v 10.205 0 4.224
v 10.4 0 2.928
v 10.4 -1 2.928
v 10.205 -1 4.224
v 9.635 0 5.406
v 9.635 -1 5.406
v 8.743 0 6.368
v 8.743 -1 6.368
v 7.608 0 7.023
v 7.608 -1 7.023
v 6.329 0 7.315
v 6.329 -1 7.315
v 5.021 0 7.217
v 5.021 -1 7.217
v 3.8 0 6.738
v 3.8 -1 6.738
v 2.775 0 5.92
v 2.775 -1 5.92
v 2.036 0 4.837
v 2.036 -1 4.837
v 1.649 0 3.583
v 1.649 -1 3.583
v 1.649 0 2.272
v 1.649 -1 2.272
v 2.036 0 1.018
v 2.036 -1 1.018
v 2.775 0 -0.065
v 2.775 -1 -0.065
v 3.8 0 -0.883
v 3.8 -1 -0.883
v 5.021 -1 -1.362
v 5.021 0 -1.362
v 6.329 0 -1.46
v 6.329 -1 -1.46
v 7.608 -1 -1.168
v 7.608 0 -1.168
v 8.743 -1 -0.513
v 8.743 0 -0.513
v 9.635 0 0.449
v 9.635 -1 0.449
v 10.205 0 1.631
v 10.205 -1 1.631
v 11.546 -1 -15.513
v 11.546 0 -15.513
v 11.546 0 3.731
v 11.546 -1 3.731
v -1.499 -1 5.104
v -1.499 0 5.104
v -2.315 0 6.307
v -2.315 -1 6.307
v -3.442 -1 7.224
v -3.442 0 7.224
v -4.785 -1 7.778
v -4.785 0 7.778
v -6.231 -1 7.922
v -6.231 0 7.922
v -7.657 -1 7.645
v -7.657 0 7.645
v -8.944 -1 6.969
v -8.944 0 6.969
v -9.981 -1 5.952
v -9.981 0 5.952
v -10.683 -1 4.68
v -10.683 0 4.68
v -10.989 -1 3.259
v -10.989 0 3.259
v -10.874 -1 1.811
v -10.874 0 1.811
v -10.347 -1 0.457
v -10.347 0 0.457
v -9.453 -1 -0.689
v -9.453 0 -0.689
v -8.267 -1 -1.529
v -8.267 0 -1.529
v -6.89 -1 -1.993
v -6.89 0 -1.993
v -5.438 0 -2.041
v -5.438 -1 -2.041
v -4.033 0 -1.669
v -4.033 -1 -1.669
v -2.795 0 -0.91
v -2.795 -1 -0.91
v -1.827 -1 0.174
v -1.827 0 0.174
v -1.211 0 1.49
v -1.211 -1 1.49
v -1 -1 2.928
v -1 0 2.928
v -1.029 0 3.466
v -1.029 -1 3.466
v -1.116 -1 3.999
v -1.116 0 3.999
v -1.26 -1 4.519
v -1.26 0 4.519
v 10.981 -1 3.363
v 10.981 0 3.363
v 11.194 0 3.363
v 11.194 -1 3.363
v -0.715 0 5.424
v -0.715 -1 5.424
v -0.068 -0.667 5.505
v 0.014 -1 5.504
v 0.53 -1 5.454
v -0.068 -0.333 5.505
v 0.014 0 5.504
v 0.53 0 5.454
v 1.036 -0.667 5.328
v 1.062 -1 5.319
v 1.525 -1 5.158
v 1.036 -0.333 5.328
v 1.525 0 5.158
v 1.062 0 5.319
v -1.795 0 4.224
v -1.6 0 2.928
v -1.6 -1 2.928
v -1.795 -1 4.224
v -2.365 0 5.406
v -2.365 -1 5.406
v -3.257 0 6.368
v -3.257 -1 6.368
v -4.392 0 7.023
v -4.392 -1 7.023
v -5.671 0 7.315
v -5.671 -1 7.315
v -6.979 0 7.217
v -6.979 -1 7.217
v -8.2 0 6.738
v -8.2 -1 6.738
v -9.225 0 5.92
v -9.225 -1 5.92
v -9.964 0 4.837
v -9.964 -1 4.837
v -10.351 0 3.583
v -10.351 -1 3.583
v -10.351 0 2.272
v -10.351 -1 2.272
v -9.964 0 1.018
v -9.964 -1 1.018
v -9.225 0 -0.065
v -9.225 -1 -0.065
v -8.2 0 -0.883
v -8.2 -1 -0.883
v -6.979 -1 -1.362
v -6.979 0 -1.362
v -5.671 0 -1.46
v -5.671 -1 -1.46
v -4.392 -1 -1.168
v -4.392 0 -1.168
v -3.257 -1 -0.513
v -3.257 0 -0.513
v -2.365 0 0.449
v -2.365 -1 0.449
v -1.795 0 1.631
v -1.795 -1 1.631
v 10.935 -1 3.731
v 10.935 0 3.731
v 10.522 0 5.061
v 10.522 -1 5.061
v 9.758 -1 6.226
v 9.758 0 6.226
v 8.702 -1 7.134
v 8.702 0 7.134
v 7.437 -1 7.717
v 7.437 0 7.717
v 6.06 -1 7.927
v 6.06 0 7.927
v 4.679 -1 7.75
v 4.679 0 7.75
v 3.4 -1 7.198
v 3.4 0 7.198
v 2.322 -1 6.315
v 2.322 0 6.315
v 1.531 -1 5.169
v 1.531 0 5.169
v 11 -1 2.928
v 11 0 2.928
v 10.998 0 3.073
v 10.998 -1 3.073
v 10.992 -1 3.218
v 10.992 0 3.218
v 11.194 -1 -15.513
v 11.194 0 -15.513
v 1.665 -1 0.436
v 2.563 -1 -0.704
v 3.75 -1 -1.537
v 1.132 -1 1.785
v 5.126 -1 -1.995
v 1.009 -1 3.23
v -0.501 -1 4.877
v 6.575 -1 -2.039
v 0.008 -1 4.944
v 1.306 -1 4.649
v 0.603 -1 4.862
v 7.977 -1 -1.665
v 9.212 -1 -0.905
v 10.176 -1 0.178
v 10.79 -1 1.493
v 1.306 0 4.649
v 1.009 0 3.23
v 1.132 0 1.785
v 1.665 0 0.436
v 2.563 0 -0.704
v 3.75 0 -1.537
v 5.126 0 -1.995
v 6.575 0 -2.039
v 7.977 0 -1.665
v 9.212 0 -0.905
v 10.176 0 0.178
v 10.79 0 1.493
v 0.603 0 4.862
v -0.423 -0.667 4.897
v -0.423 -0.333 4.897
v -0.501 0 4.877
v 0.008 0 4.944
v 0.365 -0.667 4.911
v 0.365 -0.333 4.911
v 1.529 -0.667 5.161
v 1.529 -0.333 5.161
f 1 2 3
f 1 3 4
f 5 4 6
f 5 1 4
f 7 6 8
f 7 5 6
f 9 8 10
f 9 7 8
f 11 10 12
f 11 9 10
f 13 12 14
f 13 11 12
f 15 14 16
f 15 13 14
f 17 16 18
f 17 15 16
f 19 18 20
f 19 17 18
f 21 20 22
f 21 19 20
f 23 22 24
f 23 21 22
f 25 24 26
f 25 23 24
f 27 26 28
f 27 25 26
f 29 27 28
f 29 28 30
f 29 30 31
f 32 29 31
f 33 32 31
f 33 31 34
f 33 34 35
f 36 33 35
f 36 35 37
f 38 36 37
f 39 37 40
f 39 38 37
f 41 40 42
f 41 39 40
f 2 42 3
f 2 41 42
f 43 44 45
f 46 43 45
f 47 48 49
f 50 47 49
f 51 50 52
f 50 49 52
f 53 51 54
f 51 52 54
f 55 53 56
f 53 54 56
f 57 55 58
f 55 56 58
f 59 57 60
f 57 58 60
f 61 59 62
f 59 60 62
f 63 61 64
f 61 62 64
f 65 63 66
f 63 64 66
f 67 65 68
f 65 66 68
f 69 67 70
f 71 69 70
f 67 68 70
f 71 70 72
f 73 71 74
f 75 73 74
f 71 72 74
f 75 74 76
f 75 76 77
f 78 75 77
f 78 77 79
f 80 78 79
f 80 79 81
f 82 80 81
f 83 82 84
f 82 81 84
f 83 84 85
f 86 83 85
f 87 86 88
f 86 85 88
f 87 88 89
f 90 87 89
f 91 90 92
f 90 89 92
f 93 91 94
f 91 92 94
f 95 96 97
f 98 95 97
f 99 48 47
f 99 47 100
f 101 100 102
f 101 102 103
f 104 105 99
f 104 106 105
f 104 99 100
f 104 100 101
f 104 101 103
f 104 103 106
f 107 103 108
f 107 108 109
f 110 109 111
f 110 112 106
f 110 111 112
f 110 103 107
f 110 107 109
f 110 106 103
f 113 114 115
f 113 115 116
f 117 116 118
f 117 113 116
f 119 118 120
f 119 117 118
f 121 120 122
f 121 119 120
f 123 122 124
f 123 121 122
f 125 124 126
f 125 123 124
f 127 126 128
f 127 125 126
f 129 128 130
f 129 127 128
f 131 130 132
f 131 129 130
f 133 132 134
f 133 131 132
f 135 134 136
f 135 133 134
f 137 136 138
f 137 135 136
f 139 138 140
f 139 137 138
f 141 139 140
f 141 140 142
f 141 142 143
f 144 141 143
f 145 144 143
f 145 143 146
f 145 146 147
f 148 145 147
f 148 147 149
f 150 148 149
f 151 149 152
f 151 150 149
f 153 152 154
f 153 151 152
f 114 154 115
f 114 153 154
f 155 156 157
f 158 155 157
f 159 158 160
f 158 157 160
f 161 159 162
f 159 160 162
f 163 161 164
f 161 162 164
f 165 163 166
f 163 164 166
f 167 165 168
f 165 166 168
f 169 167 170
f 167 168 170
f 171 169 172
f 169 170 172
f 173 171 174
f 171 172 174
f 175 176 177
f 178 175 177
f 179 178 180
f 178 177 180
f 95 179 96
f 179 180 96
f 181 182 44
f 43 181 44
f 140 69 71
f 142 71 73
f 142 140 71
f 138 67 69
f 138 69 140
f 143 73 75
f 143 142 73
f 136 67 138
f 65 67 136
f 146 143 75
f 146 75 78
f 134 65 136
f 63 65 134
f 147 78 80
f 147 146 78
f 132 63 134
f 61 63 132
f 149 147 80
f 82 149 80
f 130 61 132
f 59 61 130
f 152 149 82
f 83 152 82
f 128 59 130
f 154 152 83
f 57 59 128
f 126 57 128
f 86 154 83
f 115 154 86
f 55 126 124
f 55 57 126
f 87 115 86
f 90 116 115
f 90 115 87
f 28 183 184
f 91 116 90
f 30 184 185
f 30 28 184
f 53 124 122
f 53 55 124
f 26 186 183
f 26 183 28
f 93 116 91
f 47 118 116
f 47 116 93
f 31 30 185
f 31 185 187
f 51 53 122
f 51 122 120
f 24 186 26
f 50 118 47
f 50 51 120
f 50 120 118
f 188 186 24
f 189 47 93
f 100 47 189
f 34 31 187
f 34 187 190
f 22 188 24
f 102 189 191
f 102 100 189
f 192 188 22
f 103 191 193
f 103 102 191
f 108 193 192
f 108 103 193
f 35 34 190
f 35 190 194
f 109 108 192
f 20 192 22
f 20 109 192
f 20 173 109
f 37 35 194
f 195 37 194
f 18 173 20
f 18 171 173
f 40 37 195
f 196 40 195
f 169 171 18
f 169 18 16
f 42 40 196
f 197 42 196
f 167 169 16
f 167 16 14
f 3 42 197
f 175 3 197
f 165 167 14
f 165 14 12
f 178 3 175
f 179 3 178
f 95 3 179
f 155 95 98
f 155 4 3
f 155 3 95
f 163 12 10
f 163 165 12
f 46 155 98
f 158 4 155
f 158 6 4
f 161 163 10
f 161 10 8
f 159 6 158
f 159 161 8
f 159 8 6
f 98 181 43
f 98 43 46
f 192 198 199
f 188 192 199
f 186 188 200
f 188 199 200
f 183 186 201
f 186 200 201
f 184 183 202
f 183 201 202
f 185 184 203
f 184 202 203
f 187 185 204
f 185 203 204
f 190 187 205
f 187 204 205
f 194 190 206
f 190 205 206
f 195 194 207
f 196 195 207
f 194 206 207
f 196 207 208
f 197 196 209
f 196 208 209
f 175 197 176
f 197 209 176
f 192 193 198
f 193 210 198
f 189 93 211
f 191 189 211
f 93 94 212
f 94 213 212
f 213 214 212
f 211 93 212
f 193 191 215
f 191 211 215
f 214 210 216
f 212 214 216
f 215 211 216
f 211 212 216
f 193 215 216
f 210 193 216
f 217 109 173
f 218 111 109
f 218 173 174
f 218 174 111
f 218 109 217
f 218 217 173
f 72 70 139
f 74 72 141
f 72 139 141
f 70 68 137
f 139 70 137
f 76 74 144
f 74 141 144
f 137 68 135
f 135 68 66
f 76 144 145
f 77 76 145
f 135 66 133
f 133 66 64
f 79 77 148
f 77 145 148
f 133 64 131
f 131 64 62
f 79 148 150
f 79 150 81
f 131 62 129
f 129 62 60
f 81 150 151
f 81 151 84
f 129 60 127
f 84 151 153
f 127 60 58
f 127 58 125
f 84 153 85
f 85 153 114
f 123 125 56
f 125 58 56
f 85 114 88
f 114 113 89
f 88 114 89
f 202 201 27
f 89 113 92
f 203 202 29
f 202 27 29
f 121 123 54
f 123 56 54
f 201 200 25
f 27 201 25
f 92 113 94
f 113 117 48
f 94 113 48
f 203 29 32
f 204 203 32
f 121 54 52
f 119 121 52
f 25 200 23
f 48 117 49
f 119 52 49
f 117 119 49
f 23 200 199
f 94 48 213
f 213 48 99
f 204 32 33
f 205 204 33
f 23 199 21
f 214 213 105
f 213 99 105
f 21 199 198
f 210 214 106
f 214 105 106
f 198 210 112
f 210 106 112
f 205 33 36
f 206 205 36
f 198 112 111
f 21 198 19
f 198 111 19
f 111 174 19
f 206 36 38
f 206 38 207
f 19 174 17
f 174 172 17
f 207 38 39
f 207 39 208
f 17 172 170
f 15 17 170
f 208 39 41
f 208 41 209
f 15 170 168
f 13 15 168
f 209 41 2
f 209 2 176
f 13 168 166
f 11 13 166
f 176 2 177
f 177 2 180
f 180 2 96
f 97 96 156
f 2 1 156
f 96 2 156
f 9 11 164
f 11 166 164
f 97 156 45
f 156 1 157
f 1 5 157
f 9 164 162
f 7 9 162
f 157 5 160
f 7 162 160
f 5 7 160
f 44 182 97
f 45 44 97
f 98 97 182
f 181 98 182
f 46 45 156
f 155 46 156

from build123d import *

# Parameters (mm, degrees)
F0_R     = 4.4
F1_DEPTH = 1


with BuildPart() as f1:
    # F0 (on Front) → F1 (new body)
    with BuildSketch(Plane.XZ):
        with BuildLine():
            ThreePointArc((-1.4986815922, 5.1042757445), (-10.8737353251, 1.8109915545), (-1, 2.9275505456))
            ThreePointArc((-1, 2.9275505456), (-1.0654410934, 3.733855945), (-1.2600513589, 4.5190551417))
            ThreePointArc((-1.2600513589, 4.5190551417), (-1.3701106972, 4.81543959), (-1.4986815922, 5.1042757445))
        make_face()
        with Locations((-6, 2.9275505456)):
            Circle(F0_R, mode=Mode.SUBTRACT)
        with BuildLine():
            ThreePointArc((-1.4986815922, 5.1042757445), (-1.3701106972, 4.81543959), (-1.2600513589, 4.5190551417))
            add(Edge.make_bspline(
                [(-1.2600513589, 4.5190551417), (-0.3321453987, 5.1084347069), (0.2222434123, 5.0197322853), (1.305815297, 4.6493606322)],
                knots=[0, 0, 0, 0, 2.5691732555, 2.5691732555, 2.5691732555, 2.5691732555], degree=3))
            ThreePointArc((1.305815297, 4.6493606322), (1.408443121, 4.9068447194), (1.525181814, 5.1582459982))
            add(Edge.make_bspline(
                [(-1.4986815922, 5.1042757445), (0, 5.9878164902), (1.4394625627, 5.1295237069), (1.525181814, 5.1582459982)],
                knots=[0, 0, 0, 0, 0.9403135209, 0.9403135209, 0.9403135209, 0.9403135209], degree=3))
        make_face()
        with BuildLine():
            ThreePointArc((1.525181814, 5.1582459982), (1.408443121, 4.9068447194), (1.305815297, 4.6493606322))
            ThreePointArc((1.305815297, 4.6493606322), (5.1256212248, -1.9954019991), (11, 2.9275505456))
            ThreePointArc((11, 2.9275505456), (10.9952473554, 3.1455043436), (10.9809984568, 3.3630437989))
            ThreePointArc((10.9809984568, 3.3630437989), (10.9614239437, 3.5474476752), (10.9350249024, 3.7309988718))
            ThreePointArc((10.9350249024, 3.7309988718), (6.7558272917, 7.8700929182), (1.5306314581, 5.1691448079))
            add(Edge.make_bspline(
                [(1.525181814, 5.1582459982), (1.5306228506, 5.160069148), (1.5306095387, 5.165466158), (1.5306314581, 5.1691448079)],
                knots=[0.9403135209, 0.9403135209, 0.9403135209, 0.9403135209, 1, 1, 1, 1], degree=3))
        make_face()
        with Locations((6, 2.9275505456)):
            Circle(F0_R, mode=Mode.SUBTRACT)
        with BuildLine():
            ThreePointArc((10.9350249024, 3.7309988718), (10.9614239437, 3.5474476752), (10.9809984568, 3.3630437989))
            Line((10.9809984568, 3.3630437989), (11.1943203956, 3.3630437989))
            Line((11.1943203956, 3.3630437989), (11.1943203956, -15.5131826177))
            Line((11.1943203956, -15.5131826177), (11.5463633525, -15.5131826177))
            Line((11.5463633525, -15.5131826177), (11.5463633525, 3.7309988718))
            Line((11.5463633525, 3.7309988718), (10.9350249024, 3.7309988718))
        make_face()
    extrude(amount=F1_DEPTH)


solid = f1.part
